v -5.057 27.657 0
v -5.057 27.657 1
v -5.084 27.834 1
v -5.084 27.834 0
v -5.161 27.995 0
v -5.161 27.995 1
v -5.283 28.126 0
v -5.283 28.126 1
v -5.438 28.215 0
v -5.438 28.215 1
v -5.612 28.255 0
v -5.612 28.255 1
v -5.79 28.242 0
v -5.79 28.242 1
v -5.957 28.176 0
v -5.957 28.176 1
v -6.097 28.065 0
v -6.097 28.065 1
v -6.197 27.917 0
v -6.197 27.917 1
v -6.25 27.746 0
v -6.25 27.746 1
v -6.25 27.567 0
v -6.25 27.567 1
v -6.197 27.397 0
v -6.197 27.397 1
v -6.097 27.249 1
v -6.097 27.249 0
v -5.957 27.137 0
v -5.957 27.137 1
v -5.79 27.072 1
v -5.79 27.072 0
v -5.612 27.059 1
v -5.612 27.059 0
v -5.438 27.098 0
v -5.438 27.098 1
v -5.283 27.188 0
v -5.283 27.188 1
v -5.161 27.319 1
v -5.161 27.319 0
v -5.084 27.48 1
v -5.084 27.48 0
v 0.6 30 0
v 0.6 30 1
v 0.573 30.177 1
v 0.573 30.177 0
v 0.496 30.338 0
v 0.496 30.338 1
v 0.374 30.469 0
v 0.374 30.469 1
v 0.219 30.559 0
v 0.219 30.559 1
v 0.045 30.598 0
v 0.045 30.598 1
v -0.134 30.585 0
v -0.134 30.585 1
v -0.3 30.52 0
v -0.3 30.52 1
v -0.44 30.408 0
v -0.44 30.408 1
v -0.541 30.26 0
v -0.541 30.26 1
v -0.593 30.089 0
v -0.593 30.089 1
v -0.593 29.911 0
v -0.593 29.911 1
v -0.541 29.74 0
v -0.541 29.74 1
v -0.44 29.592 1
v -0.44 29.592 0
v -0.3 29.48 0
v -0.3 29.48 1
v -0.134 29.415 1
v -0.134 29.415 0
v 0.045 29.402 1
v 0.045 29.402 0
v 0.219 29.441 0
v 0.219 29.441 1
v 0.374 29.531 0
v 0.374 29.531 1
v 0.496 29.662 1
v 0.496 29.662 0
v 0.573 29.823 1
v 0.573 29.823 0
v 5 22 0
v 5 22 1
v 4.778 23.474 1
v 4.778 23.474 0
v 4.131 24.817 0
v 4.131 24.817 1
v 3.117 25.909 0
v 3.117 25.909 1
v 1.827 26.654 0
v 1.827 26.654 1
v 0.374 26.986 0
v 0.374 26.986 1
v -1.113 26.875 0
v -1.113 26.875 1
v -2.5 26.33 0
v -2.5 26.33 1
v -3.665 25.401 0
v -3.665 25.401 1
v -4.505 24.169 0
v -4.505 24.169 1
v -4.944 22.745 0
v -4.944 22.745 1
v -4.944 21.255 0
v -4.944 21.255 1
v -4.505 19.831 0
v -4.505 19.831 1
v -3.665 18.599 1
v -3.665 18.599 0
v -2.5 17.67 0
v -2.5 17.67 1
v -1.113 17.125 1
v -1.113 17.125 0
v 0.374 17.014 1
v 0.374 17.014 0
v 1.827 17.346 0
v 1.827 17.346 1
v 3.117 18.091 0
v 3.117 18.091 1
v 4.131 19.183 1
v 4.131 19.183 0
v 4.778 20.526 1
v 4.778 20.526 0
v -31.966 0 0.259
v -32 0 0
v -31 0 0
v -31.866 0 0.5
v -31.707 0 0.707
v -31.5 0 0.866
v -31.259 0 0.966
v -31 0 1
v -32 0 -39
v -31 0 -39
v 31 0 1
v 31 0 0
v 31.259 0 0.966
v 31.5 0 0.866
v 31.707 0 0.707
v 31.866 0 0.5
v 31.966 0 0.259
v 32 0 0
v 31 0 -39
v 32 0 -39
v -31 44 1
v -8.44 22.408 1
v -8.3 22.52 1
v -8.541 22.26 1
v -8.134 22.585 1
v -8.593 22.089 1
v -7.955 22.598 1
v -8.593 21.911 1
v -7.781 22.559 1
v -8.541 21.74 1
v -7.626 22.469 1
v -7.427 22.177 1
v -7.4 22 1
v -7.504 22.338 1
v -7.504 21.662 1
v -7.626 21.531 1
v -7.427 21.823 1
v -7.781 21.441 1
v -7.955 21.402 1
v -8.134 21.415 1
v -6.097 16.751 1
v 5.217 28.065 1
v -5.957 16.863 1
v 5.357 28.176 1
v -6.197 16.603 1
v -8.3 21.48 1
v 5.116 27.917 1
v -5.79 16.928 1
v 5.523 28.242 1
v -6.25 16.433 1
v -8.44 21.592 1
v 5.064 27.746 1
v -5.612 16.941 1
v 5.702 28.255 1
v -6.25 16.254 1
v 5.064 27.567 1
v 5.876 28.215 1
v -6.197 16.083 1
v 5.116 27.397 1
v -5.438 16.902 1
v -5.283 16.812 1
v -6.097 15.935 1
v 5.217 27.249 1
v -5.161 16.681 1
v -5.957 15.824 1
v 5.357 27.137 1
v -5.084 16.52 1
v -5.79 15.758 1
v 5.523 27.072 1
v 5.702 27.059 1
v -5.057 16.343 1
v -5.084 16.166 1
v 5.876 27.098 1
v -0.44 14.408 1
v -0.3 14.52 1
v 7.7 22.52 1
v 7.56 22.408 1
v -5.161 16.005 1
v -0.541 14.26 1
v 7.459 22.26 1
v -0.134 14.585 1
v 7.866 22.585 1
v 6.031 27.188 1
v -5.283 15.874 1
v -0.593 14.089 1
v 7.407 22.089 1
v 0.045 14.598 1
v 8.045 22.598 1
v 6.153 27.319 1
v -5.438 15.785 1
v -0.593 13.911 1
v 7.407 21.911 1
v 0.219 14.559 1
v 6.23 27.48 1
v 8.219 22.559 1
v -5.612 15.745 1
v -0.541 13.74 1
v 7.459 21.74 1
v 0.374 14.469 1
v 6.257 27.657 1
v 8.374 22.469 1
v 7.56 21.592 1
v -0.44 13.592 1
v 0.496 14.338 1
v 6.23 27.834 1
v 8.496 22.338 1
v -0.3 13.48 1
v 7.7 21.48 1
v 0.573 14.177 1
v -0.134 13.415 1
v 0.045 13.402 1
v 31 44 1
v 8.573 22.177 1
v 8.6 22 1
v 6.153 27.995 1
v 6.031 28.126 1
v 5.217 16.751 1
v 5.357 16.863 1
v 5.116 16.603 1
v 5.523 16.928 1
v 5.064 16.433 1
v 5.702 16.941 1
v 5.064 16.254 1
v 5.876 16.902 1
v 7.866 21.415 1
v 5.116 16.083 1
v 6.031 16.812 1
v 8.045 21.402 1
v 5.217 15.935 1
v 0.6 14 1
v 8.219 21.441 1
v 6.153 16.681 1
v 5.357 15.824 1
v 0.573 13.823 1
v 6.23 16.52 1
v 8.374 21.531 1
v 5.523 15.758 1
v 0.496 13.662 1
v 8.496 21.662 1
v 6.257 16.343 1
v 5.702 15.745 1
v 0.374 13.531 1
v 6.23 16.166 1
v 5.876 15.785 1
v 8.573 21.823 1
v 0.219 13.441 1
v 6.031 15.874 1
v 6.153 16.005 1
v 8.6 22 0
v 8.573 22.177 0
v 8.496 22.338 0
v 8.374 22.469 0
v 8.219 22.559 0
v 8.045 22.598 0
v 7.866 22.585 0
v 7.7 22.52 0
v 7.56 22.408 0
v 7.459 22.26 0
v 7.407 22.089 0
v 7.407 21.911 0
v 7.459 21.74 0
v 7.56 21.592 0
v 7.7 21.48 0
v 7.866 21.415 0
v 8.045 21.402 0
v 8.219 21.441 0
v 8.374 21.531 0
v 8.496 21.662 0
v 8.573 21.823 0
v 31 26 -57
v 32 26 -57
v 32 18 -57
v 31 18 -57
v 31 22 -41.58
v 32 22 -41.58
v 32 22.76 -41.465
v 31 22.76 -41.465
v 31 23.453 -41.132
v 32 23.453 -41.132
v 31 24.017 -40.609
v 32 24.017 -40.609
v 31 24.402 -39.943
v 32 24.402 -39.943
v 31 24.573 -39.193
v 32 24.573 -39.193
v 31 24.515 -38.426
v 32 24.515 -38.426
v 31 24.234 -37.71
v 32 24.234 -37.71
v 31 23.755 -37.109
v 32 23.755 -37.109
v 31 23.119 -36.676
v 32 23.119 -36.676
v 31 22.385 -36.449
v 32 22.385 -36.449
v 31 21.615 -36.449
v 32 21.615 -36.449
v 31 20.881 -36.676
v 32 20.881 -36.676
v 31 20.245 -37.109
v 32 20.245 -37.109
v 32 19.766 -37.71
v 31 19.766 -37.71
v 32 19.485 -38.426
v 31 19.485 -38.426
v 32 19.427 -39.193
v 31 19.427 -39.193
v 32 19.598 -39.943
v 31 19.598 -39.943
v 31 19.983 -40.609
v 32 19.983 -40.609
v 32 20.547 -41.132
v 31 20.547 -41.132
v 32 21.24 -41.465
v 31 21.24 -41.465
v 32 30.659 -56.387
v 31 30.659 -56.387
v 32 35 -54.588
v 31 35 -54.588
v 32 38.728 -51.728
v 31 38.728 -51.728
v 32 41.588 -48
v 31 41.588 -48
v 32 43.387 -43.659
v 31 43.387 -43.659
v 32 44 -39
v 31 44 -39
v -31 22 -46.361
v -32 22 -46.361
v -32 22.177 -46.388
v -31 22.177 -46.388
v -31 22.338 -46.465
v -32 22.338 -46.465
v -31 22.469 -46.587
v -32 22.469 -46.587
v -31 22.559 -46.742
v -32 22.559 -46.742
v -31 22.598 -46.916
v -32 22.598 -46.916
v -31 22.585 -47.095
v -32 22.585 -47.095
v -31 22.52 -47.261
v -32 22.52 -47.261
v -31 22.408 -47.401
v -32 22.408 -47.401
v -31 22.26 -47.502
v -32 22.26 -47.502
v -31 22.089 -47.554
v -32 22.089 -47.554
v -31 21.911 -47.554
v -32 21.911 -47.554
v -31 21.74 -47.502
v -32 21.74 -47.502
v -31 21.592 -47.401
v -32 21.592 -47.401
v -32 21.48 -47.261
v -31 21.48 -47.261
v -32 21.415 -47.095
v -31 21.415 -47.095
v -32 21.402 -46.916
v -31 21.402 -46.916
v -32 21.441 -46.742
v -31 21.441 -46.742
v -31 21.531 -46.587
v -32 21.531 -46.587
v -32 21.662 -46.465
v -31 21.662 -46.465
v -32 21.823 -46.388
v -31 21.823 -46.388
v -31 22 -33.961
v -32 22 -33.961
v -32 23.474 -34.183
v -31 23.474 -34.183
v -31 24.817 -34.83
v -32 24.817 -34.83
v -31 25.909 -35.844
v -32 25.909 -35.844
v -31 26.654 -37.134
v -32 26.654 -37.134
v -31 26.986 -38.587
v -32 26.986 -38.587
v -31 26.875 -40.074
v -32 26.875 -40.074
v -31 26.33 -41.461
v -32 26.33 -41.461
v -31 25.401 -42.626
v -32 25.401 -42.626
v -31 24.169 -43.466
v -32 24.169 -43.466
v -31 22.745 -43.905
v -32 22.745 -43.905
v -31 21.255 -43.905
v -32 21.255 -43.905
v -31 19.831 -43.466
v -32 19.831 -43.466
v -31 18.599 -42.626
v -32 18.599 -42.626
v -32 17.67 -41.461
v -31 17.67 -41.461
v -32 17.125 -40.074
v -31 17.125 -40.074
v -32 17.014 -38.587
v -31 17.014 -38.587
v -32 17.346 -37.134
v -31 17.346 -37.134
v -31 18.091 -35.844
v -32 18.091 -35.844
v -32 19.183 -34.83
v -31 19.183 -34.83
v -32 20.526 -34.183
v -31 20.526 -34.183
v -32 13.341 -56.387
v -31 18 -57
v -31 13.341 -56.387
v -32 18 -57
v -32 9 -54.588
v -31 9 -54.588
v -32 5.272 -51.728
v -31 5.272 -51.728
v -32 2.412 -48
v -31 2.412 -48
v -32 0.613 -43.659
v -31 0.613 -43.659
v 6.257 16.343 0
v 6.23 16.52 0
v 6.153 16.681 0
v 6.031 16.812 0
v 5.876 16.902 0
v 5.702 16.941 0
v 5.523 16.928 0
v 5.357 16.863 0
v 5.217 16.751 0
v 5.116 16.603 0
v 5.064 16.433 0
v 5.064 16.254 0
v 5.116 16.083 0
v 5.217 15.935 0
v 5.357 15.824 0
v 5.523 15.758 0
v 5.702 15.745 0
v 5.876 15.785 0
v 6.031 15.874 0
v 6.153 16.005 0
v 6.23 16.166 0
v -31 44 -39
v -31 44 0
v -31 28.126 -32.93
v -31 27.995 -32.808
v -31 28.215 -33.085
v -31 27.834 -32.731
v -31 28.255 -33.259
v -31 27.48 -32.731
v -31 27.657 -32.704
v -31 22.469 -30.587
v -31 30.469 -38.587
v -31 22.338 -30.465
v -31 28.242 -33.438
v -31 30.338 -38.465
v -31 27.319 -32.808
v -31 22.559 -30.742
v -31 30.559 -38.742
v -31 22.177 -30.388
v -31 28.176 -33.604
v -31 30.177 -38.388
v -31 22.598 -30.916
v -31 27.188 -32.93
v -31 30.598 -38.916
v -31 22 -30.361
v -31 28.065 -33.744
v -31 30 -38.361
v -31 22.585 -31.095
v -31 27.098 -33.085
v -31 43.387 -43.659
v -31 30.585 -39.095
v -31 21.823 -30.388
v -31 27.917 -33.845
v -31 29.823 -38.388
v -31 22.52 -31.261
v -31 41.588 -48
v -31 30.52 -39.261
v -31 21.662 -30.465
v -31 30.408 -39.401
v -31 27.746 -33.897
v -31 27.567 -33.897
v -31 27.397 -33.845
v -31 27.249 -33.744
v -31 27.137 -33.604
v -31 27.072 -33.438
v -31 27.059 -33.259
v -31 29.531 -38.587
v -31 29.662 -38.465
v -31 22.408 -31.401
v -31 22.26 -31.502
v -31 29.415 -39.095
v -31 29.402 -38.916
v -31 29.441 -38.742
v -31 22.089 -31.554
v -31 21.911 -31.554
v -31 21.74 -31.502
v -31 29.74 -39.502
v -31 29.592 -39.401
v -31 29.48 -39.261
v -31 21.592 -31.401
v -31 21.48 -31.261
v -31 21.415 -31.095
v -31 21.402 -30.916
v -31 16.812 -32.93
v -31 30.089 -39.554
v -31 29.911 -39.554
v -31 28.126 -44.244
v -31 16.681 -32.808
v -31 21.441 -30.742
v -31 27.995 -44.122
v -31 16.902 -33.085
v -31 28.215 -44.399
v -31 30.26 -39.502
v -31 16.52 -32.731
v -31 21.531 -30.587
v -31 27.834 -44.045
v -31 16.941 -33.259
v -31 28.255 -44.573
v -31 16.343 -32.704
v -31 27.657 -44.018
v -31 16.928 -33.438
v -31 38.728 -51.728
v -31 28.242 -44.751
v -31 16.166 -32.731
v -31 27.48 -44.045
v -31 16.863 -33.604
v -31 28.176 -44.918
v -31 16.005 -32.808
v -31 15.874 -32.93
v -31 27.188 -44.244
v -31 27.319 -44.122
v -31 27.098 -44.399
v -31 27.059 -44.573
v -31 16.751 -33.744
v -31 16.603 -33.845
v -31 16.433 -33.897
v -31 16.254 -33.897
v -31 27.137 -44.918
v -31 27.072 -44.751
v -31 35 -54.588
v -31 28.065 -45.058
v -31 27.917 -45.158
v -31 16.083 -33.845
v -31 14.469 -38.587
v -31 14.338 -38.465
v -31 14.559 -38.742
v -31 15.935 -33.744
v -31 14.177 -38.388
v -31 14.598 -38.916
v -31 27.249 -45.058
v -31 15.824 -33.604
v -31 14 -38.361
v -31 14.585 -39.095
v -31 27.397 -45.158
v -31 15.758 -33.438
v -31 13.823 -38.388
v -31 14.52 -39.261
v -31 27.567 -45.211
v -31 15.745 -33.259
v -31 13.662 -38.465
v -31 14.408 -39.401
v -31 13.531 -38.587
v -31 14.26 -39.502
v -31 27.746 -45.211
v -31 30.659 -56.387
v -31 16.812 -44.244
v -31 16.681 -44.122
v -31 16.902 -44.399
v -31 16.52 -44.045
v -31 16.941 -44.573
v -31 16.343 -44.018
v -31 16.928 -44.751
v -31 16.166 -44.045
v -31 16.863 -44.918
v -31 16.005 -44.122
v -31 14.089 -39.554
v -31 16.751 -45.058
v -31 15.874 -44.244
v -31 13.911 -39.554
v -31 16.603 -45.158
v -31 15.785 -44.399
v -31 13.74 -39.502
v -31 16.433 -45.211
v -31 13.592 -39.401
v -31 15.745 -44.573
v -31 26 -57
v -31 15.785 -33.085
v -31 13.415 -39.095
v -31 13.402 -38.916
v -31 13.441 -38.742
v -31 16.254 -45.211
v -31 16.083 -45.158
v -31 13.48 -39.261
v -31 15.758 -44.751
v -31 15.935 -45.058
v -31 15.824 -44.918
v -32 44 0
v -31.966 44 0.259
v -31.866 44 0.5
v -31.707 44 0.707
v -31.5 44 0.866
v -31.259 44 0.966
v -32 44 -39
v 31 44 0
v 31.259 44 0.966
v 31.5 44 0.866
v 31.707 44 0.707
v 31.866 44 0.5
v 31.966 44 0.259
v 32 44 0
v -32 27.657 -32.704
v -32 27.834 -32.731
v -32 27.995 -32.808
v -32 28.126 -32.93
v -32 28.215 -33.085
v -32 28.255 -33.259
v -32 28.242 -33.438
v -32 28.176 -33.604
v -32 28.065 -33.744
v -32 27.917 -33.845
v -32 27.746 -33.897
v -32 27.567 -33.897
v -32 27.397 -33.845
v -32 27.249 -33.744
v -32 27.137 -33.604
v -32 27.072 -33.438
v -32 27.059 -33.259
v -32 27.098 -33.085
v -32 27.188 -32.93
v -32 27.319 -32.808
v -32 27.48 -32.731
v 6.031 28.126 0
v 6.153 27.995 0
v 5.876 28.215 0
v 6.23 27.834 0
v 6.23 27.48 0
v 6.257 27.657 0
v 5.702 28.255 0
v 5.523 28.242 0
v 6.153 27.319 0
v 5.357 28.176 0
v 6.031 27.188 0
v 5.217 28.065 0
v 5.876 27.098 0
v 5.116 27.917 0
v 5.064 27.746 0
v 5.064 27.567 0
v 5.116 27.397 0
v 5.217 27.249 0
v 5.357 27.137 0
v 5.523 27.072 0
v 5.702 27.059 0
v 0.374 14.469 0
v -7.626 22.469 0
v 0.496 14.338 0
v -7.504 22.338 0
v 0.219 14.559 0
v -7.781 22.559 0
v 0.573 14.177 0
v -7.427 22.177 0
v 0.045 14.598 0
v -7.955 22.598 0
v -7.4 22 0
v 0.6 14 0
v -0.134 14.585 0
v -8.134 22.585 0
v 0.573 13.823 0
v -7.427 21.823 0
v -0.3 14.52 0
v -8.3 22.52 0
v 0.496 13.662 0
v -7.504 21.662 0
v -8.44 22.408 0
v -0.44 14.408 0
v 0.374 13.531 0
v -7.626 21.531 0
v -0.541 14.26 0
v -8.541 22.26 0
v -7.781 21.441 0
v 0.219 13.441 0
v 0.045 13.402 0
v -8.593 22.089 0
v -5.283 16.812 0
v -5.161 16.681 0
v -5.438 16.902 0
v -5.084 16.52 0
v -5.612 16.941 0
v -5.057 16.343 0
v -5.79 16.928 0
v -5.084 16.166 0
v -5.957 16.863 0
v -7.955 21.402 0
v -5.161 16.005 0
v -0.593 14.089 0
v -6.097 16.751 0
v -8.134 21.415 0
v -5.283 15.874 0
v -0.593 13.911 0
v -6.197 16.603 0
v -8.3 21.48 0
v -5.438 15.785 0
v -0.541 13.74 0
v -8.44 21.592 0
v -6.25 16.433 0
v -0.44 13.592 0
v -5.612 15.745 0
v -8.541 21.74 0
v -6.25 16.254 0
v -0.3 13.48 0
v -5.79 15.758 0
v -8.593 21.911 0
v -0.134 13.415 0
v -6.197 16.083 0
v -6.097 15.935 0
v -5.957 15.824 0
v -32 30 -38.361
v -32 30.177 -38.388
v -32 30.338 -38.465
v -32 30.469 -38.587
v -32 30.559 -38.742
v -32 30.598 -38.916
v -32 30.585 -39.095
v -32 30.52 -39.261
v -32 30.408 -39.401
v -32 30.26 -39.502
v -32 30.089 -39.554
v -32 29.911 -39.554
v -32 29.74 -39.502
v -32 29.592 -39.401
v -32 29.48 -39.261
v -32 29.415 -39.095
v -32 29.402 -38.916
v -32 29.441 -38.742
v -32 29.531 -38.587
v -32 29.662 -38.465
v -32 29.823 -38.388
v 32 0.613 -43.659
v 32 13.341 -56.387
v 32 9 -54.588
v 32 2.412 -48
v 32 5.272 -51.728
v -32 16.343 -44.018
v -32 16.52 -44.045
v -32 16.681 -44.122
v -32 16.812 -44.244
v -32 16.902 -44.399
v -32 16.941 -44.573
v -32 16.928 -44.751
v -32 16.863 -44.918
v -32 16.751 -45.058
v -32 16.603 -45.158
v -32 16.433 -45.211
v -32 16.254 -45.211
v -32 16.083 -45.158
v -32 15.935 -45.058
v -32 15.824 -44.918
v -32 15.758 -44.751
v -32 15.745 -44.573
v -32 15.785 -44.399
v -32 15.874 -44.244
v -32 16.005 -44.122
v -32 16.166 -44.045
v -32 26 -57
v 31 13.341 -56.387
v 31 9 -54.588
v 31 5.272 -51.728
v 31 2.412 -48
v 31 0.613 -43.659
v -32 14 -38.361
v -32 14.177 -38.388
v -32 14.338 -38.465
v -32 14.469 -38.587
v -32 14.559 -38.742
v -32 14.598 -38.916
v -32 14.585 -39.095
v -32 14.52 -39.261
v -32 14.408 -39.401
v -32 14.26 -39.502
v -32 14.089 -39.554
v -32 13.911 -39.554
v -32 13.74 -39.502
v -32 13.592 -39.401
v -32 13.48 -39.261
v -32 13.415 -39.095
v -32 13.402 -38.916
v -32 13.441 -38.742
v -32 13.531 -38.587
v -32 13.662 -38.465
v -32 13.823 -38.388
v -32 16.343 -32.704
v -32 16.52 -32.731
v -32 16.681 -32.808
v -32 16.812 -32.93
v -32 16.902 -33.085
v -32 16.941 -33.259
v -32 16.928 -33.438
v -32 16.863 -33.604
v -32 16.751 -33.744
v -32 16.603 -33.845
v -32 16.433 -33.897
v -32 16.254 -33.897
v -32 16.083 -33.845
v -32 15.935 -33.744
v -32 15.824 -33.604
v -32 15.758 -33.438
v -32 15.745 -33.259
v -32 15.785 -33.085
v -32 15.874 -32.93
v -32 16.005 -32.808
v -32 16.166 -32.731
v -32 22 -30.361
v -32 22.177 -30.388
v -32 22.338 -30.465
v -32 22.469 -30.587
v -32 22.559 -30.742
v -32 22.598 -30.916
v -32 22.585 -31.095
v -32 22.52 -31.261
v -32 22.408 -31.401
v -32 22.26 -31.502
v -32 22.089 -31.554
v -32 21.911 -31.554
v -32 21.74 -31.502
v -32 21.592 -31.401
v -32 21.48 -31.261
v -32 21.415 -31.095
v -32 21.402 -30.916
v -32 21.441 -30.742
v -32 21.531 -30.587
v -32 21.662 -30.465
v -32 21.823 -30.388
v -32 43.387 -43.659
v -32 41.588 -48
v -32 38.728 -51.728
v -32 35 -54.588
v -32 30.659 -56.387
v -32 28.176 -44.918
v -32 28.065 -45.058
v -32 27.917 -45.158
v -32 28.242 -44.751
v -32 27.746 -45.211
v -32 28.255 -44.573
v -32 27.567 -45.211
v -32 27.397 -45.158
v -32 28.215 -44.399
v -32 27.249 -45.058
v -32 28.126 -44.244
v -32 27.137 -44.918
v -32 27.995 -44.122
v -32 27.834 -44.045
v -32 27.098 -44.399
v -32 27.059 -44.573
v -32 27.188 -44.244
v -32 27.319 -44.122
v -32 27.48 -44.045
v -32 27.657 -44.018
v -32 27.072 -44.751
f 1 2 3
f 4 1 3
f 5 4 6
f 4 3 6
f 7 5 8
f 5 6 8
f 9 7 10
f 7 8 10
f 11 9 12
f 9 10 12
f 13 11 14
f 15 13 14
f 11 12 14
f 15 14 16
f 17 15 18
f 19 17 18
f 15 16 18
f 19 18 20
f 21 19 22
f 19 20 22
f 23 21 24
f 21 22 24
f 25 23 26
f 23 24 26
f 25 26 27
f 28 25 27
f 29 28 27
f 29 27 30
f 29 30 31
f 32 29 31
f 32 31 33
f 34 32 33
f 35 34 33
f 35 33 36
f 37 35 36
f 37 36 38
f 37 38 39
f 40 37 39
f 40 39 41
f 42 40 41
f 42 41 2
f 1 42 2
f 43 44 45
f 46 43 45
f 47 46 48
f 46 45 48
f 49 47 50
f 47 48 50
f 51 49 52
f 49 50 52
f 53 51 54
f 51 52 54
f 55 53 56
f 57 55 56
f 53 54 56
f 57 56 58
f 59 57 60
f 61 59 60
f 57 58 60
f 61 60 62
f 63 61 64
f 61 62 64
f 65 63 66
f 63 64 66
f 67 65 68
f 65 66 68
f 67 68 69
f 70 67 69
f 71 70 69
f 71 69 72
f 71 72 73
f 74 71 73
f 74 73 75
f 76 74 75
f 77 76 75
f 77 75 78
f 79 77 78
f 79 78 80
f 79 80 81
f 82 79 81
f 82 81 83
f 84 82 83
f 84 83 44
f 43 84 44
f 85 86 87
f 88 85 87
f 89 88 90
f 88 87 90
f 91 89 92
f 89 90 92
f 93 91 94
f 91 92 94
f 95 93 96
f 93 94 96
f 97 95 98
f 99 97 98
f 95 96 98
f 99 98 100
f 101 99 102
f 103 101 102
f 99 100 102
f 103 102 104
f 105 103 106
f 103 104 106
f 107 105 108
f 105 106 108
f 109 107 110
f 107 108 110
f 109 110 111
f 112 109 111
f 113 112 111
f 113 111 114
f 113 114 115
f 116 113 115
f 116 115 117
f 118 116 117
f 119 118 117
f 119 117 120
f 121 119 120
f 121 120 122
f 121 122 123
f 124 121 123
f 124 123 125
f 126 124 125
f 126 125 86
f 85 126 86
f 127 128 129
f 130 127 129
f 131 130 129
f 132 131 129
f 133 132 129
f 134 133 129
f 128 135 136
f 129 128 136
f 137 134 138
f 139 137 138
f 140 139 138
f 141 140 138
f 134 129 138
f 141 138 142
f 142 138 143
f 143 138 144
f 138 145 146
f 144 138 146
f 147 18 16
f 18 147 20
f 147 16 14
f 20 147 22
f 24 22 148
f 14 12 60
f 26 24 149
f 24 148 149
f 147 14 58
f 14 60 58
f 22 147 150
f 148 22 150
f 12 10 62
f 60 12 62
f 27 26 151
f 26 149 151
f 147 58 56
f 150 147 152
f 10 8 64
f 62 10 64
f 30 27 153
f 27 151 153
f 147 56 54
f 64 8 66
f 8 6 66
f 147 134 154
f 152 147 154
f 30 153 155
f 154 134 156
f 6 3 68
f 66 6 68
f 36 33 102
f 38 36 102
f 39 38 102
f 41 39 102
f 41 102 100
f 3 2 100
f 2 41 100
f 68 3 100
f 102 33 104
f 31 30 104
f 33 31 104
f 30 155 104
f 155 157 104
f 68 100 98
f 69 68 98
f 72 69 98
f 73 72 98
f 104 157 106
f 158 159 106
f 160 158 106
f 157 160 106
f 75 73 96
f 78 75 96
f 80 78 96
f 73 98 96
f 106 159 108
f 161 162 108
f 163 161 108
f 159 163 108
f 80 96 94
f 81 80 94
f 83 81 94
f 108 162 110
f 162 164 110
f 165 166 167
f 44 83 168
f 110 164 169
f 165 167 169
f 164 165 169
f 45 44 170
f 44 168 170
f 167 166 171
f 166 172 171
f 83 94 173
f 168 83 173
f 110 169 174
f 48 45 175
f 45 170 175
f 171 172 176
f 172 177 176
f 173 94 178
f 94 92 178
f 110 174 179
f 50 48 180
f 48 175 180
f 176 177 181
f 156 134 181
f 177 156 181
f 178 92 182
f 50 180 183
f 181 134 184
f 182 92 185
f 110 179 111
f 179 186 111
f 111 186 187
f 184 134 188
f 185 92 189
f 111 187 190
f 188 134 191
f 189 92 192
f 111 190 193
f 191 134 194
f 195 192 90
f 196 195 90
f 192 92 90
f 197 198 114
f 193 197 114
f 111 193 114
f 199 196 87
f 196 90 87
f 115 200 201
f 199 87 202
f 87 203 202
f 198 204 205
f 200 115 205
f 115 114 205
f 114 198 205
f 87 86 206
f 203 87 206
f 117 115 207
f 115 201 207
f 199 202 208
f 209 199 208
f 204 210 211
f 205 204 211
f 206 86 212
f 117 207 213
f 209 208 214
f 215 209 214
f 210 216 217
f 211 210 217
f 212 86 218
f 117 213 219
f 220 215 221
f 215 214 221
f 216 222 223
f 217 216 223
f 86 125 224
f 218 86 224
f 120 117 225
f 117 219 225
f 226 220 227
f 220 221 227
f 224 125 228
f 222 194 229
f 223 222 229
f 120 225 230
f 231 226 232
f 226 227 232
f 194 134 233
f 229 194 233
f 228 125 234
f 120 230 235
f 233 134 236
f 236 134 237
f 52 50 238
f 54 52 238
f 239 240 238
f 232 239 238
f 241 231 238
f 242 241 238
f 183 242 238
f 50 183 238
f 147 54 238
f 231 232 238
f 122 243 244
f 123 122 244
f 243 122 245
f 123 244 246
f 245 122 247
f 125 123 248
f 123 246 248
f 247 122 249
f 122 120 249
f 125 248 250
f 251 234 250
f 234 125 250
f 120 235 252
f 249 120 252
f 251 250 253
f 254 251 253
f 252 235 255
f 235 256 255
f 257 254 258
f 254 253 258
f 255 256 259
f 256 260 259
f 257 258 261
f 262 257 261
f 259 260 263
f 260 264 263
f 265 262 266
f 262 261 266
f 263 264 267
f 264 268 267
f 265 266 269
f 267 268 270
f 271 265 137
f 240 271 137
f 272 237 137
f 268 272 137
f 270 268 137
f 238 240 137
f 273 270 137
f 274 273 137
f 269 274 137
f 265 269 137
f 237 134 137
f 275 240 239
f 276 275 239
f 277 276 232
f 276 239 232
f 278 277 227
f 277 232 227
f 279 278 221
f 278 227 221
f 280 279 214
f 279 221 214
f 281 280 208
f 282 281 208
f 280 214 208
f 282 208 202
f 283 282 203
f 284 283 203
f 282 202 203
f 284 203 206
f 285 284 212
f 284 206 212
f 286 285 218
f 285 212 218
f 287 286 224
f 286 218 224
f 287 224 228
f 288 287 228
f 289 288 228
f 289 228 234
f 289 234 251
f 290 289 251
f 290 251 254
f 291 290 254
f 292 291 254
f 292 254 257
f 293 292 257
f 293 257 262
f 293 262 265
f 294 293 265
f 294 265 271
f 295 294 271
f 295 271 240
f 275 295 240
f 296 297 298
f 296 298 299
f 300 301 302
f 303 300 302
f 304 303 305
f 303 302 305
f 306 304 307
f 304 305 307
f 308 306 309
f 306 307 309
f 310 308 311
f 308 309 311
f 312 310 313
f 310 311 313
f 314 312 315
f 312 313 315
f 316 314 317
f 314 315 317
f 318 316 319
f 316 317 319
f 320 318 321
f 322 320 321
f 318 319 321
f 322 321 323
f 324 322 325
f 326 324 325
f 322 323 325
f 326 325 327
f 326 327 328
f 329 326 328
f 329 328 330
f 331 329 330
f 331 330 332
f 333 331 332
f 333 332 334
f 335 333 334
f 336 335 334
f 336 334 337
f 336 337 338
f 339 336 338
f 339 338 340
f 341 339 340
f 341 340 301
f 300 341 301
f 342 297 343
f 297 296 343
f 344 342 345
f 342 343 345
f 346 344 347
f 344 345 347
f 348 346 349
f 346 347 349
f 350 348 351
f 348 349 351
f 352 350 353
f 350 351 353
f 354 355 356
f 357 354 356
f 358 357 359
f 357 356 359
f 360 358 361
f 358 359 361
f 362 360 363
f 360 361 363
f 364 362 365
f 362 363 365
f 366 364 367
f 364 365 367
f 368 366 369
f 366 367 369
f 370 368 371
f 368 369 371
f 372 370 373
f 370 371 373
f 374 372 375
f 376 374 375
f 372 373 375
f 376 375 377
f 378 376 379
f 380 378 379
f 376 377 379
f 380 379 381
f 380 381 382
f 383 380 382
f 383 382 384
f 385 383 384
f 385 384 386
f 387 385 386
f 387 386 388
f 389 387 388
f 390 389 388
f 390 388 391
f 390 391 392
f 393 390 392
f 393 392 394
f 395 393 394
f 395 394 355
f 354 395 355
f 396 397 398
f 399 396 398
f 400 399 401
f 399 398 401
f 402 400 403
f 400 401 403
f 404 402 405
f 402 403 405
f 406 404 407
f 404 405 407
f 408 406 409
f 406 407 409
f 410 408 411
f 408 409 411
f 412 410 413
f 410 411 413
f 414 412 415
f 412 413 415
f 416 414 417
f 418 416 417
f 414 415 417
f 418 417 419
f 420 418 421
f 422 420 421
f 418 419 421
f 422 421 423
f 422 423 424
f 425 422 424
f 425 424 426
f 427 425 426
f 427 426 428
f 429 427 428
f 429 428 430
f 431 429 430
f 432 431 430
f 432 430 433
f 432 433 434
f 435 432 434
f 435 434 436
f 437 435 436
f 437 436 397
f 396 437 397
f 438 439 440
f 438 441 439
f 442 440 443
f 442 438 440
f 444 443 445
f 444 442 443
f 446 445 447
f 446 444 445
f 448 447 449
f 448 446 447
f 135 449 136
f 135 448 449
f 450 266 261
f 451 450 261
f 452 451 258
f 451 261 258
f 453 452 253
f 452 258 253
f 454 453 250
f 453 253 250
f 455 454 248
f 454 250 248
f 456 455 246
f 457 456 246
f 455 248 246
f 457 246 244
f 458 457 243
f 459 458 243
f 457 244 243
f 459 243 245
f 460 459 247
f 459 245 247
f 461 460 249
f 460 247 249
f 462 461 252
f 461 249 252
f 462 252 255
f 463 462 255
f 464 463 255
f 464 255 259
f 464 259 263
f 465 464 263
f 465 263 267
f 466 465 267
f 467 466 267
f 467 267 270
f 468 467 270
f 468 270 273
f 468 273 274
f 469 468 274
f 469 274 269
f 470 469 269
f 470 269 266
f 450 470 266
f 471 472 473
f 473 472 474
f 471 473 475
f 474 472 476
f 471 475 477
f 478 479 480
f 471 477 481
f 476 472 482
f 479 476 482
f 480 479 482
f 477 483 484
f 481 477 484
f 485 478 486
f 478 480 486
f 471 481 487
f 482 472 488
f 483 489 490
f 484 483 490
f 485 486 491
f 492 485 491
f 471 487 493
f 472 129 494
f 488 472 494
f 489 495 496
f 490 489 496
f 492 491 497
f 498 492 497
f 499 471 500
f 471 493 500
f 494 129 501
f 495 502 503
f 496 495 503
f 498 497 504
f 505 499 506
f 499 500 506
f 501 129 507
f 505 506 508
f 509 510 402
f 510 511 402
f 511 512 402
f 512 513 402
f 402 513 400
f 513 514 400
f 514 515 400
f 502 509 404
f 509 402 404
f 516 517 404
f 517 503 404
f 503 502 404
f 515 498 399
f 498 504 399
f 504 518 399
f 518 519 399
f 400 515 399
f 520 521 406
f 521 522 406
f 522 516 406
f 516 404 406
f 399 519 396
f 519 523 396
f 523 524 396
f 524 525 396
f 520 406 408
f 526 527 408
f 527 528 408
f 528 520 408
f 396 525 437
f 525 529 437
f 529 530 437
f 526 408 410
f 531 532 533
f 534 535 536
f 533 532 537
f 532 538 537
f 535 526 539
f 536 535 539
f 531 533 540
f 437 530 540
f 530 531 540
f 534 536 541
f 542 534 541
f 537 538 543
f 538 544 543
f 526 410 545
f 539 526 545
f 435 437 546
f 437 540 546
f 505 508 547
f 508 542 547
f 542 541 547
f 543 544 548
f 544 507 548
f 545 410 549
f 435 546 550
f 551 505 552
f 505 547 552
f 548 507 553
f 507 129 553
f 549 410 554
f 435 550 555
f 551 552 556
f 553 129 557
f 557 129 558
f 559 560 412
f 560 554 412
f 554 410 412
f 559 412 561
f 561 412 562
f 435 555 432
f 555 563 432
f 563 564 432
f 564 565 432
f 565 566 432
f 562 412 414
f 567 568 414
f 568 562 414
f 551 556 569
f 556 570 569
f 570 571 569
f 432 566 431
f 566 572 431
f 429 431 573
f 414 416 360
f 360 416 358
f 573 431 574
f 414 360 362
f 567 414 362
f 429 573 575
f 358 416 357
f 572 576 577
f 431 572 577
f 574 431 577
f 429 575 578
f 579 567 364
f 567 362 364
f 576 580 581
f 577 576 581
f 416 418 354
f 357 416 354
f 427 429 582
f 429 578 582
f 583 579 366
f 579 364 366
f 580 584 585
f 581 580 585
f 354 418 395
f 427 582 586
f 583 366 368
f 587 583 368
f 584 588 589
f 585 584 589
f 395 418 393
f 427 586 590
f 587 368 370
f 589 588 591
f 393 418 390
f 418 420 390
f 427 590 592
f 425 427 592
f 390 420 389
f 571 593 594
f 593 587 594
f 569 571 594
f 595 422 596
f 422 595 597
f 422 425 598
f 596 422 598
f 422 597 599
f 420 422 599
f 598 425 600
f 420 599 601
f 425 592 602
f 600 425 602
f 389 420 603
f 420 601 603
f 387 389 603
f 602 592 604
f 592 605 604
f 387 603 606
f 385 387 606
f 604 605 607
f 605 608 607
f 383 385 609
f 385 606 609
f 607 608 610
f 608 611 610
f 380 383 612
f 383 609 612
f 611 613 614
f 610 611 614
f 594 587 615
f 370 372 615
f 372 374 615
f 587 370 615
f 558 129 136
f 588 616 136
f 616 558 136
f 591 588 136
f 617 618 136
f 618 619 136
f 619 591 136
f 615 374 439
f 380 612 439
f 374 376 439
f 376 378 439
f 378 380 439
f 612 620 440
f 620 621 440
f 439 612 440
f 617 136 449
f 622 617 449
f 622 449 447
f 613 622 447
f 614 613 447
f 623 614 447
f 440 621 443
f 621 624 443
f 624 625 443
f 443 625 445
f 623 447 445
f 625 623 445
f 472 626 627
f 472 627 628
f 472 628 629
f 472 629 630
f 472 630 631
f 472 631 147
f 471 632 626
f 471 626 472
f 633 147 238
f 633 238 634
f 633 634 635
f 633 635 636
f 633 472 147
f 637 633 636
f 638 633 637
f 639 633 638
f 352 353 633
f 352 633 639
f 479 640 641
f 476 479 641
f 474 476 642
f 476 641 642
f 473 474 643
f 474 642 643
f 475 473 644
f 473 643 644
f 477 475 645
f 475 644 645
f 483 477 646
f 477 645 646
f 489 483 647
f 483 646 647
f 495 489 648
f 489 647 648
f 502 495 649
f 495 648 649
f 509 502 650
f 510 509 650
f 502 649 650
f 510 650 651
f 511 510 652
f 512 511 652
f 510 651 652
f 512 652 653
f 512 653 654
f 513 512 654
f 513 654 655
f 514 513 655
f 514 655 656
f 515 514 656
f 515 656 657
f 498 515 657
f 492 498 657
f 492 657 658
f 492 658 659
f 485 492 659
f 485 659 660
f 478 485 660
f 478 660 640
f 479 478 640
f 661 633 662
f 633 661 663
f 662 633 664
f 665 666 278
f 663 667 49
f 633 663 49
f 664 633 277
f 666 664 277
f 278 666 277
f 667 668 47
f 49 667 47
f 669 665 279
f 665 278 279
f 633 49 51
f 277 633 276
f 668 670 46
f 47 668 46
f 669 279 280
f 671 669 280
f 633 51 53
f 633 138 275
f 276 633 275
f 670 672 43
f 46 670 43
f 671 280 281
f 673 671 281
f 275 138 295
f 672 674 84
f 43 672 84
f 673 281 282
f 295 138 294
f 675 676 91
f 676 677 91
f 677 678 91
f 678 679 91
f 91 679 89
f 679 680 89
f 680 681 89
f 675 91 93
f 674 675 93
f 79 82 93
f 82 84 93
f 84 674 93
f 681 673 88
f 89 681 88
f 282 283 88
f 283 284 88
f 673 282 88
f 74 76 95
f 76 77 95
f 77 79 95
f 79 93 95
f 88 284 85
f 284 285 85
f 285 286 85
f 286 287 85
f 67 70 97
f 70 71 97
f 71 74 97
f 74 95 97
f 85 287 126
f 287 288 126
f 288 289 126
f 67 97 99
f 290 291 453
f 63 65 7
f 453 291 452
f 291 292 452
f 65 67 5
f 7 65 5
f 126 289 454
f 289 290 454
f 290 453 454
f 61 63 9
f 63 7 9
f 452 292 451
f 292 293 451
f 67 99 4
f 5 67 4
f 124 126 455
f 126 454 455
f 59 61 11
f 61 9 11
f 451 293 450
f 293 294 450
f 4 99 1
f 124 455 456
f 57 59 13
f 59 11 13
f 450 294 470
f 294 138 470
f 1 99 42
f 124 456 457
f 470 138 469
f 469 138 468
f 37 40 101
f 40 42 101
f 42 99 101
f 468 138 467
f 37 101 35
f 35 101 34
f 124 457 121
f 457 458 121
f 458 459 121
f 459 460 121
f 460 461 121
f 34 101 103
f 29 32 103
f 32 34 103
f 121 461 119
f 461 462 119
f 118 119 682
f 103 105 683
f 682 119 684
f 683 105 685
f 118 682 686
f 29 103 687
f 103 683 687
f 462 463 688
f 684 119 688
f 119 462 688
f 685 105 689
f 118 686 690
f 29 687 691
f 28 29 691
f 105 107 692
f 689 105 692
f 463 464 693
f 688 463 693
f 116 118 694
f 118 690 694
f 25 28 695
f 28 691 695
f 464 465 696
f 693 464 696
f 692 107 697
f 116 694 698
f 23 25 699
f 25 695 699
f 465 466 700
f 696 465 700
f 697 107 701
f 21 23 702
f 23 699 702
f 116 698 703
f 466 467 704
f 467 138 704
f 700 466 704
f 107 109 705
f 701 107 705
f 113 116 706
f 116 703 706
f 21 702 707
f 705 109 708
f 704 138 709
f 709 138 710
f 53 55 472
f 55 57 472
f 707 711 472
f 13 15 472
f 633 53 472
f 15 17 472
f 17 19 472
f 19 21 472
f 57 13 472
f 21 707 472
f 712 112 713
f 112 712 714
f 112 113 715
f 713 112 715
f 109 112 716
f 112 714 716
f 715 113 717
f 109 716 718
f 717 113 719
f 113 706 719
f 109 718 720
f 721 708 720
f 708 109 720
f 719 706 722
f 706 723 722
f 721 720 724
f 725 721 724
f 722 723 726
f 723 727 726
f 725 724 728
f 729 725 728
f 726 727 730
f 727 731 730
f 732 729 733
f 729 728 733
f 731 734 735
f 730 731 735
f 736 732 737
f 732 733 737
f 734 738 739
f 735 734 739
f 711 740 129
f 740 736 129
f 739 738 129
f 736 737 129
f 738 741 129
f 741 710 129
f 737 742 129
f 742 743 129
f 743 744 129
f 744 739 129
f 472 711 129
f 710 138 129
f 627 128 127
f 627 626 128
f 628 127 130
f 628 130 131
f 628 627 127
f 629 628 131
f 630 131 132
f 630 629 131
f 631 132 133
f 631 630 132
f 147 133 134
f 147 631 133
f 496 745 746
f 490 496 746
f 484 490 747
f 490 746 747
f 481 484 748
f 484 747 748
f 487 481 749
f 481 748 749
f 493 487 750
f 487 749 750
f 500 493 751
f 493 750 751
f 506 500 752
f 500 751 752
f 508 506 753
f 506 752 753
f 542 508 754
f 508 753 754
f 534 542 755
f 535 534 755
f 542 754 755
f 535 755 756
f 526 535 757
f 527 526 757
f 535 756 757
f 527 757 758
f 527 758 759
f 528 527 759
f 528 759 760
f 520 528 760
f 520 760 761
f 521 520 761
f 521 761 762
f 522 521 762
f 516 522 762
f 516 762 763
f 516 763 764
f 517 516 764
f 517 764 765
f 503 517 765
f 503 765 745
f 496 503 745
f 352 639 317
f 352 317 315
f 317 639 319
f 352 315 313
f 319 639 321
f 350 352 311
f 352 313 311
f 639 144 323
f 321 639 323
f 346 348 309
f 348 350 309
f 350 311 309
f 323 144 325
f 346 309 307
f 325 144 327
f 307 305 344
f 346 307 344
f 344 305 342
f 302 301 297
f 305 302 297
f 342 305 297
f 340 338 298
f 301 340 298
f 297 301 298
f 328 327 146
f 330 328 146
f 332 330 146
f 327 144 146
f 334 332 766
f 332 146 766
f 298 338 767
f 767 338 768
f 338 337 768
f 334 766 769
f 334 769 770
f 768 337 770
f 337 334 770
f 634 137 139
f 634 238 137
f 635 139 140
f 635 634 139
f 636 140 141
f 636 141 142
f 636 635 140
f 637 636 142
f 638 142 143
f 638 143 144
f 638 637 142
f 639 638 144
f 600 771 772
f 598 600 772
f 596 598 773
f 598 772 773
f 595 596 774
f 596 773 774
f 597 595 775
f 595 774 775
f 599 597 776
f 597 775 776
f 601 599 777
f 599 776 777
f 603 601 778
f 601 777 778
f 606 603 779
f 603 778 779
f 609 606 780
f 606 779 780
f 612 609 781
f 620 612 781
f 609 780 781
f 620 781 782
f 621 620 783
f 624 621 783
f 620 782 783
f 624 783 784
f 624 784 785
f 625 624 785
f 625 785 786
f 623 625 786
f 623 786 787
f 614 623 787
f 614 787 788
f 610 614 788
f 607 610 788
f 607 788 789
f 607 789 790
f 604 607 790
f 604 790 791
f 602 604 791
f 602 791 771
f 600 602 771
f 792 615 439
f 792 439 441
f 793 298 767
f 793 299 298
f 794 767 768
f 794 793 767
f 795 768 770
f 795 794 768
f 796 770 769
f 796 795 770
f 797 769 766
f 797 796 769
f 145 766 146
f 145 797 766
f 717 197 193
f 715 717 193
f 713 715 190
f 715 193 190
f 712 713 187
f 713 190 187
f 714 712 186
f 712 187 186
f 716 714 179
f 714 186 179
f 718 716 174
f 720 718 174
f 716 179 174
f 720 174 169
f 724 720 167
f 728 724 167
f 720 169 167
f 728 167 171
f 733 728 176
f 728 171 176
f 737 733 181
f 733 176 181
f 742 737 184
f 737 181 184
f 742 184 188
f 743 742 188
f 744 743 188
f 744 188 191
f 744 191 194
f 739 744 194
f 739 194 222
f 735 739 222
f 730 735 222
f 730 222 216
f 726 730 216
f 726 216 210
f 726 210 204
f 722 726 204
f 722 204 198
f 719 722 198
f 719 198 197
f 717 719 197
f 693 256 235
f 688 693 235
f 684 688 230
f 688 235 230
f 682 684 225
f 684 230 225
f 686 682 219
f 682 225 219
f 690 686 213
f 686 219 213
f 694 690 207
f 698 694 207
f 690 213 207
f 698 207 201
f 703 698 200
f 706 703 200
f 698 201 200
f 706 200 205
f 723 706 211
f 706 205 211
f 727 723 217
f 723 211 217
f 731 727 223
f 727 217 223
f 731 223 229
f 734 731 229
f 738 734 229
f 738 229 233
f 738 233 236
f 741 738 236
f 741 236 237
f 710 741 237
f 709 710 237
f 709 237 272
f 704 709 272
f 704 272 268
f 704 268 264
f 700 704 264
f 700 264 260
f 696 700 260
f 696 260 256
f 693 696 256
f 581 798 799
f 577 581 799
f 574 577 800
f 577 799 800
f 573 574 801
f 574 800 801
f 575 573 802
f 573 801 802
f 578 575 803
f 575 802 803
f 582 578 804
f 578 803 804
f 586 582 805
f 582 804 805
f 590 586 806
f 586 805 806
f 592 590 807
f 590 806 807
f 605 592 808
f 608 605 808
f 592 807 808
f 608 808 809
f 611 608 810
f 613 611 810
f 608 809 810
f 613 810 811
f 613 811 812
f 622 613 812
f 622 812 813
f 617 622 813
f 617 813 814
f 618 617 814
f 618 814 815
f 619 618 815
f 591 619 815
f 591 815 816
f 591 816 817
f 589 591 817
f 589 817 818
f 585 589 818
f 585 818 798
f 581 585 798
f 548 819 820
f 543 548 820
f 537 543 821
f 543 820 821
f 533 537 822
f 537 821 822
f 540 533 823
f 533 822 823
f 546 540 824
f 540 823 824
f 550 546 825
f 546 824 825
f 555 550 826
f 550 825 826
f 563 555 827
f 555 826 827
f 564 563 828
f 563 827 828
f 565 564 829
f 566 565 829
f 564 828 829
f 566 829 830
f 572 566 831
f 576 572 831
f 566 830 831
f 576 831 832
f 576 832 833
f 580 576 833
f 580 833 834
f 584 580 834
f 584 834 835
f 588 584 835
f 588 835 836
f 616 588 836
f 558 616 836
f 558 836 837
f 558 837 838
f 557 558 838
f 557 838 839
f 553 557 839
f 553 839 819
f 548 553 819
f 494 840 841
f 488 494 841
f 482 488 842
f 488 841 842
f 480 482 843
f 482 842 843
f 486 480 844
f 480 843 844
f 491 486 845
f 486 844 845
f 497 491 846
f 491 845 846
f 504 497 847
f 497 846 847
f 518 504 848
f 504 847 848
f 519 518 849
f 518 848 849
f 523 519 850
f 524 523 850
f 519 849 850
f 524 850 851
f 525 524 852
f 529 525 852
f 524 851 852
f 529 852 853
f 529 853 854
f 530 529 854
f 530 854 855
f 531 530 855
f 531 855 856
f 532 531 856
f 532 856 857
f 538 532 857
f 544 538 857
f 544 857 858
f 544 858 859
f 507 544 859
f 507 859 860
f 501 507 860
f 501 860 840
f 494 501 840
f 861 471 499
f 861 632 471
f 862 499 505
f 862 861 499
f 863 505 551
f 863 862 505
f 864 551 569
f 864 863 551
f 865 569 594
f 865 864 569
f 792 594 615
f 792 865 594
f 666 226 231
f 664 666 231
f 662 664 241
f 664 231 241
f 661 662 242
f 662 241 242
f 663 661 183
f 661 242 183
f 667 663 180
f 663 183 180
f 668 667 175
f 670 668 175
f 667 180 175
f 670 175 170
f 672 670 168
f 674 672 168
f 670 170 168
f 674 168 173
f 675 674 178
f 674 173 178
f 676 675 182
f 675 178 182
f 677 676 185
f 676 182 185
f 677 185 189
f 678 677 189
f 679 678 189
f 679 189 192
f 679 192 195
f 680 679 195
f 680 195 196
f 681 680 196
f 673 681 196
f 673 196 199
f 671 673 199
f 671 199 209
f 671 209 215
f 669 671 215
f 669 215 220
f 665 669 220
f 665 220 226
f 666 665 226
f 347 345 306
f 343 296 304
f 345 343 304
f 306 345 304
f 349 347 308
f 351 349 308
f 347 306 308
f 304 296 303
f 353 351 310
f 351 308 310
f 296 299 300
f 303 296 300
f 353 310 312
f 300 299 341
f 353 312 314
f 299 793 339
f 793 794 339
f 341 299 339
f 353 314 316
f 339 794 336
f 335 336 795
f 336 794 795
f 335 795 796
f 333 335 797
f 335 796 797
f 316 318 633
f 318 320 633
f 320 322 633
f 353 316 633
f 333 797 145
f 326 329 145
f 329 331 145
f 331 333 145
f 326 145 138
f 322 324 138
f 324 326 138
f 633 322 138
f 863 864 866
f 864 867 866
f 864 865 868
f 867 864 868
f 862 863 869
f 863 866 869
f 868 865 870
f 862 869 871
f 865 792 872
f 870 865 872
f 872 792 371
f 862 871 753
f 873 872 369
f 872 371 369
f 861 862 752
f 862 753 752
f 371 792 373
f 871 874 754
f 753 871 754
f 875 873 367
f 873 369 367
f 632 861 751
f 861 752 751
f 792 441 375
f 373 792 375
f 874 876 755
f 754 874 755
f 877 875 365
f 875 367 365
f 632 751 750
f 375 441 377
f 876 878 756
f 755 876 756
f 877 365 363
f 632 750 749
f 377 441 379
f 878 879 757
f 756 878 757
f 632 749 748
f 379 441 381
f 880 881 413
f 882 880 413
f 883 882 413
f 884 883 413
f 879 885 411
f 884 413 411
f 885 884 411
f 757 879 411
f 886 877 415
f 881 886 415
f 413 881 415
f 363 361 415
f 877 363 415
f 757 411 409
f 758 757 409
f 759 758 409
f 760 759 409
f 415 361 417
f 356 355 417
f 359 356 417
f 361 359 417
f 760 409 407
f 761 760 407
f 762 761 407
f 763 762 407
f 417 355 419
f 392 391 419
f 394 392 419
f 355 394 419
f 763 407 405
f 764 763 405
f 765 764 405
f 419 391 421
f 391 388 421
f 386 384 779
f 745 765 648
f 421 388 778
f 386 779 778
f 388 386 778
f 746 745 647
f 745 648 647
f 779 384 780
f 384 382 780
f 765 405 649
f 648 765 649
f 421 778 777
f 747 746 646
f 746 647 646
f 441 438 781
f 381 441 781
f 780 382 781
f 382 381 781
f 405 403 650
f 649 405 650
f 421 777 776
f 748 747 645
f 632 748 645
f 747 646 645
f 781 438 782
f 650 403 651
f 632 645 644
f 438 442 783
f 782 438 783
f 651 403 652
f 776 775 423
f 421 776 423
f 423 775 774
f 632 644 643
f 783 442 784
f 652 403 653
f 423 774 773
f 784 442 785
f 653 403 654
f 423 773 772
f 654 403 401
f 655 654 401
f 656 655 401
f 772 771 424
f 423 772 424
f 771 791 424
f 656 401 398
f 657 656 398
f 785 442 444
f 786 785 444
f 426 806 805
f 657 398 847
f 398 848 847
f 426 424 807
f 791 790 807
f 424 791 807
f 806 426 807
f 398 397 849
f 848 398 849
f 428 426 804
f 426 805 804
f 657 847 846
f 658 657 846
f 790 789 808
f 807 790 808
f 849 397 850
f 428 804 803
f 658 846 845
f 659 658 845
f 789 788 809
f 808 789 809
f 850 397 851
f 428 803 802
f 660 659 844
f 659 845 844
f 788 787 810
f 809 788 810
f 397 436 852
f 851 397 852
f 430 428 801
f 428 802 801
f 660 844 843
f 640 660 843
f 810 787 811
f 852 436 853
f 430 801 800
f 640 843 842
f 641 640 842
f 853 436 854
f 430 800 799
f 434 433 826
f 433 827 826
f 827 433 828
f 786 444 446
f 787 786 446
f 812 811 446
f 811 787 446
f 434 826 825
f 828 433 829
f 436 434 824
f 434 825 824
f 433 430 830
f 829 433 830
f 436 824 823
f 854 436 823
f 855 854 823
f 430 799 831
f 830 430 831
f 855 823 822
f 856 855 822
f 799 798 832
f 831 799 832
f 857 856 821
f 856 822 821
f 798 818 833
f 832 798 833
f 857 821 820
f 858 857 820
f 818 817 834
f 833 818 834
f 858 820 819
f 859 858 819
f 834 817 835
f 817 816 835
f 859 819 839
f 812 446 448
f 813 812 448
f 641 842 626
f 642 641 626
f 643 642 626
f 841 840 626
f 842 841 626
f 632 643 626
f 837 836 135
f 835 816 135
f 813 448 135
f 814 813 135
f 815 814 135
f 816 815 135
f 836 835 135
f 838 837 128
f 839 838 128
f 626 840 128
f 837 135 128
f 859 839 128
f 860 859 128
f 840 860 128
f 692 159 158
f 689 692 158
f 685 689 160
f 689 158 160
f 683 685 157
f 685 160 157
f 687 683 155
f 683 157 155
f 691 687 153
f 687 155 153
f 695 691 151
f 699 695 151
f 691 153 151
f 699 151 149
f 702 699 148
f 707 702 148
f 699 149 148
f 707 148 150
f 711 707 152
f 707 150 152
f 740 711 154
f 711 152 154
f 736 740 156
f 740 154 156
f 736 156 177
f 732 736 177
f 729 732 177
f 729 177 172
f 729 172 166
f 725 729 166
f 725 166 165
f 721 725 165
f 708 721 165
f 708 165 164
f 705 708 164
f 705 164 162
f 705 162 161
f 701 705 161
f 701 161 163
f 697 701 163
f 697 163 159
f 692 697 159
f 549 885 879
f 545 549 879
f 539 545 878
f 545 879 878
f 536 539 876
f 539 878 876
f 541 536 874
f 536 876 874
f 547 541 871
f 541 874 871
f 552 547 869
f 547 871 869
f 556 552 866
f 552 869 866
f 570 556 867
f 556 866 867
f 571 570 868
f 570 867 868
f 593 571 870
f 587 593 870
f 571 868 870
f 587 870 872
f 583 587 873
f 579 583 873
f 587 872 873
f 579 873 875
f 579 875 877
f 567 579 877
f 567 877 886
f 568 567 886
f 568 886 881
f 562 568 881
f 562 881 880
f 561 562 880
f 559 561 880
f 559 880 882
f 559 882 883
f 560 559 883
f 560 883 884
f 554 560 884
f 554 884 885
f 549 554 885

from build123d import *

# Parameters (mm, degrees)
EXTRUDE_THIN1_DEPTH = 44
SKETCH2_R           = 2.58
CUT_EXTRUDE1_DEPTH  = 10
FILLET1_R           = 18
FILLET2_R           = 18
FILLET3_R           = 18
FILLET4_R           = 18
FILLET5_R           = 1
FILLET6_R           = 1
SKETCH11_R          = 5
SKETCH11_R_2        = 0.6
CUT_EXTRUDE2_DEPTH  = 10
SKETCH12_R          = 5
SKETCH12_R_2        = 0.6
CUT_EXTRUDE3_DEPTH  = 10


with BuildPart() as part:
    # Sketch1 → Extrude-Thin1 (new body)
    with BuildSketch(Plane(origin=(0, 0, 0), x_dir=(1, 0, 0), z_dir=(0, 1, 0))):
        Polygon((31, 57), (31, 0), (-31, 0), (-31, 57), (-32, 57), (-32, -1), (32, -1), (32, 57), align=None)
    extrude(amount=EXTRUDE_THIN1_DEPTH)

    # Sketch2 → Cut-Extrude1 (cut)
    with BuildSketch(Plane(origin=(32, 0, 0), x_dir=(0, 0, -1), z_dir=(1, 0, 0))):
        with Locations((39, 22)):
            Circle(SKETCH2_R)
    extrude(amount=-CUT_EXTRUDE1_DEPTH, mode=Mode.SUBTRACT)

    # Fillet1
    fillet1_edges = [part.edges().sort_by_distance(p)[0] for p in [
        (31.5, 0, -57),
    ]]
    fillet(fillet1_edges, radius=FILLET1_R)

    # Fillet2
    fillet2_edges = [part.edges().sort_by_distance(p)[0] for p in [
        (31.5, 44, -57),
    ]]
    fillet(fillet2_edges, radius=FILLET2_R)

    # Fillet3
    fillet3_edges = [part.edges().sort_by_distance(p)[0] for p in [
        (-31.5, 44, -57),
    ]]
    fillet(fillet3_edges, radius=FILLET3_R)

    # Fillet4
    fillet4_edges = [part.edges().sort_by_distance(p)[0] for p in [
        (-31.5, 0, -57),
    ]]
    fillet(fillet4_edges, radius=FILLET4_R)

    # Fillet5
    fillet5_edges = [part.edges().sort_by_distance(p)[0] for p in [
        (-32, 22, 1),
    ]]
    fillet(fillet5_edges, radius=FILLET5_R)

    # Fillet6
    fillet6_edges = [part.edges().sort_by_distance(p)[0] for p in [
        (32, 22, 1),
    ]]
    fillet(fillet6_edges, radius=FILLET6_R)

    # Sketch11 → Cut-Extrude2 (cut)
    with BuildSketch(Plane.ZY.offset(32)):
        with Locations((-38.961003009, 22)):
            Circle(SKETCH11_R)
        with Locations((-38.961003009, 30)):
            Circle(SKETCH11_R_2)
        with Locations((-30.961003009, 22)):
            Circle(SKETCH11_R_2)
        with Locations((-38.961003009, 14)):
            Circle(SKETCH11_R_2)
        with Locations((-46.961003009, 22)):
            Circle(SKETCH11_R_2)
        with Locations((-44.617857259, 27.656854249)):
            Circle(SKETCH11_R_2)
        with Locations((-33.30414876, 27.656854249)):
            Circle(SKETCH11_R_2)
        with Locations((-33.30414876, 16.343145751)):
            Circle(SKETCH11_R_2)
        with Locations((-44.617857259, 16.343145751)):
            Circle(SKETCH11_R_2)
    extrude(amount=-CUT_EXTRUDE2_DEPTH, mode=Mode.SUBTRACT)

    # Sketch12 → Cut-Extrude3 (cut)
    with BuildSketch(Plane.XY.offset(1)):
        with Locations((0, 22)):
            Circle(SKETCH12_R)
        with Locations((0, 30)):
            Circle(SKETCH12_R_2)
        with Locations((5.656854249, 27.656854249)):
            Circle(SKETCH12_R_2)
        with Locations((8, 22)):
            Circle(SKETCH12_R_2)
        with Locations((5.656854249, 16.343145751)):
            Circle(SKETCH12_R_2)
        with Locations((0, 14)):
            Circle(SKETCH12_R_2)
        with Locations((-5.656854249, 16.343145751)):
            Circle(SKETCH12_R_2)
        with Locations((-8, 22)):
            Circle(SKETCH12_R_2)
        with Locations((-5.656854249, 27.656854249)):
            Circle(SKETCH12_R_2)
    extrude(amount=-CUT_EXTRUDE3_DEPTH, mode=Mode.SUBTRACT)


solid = part.part
